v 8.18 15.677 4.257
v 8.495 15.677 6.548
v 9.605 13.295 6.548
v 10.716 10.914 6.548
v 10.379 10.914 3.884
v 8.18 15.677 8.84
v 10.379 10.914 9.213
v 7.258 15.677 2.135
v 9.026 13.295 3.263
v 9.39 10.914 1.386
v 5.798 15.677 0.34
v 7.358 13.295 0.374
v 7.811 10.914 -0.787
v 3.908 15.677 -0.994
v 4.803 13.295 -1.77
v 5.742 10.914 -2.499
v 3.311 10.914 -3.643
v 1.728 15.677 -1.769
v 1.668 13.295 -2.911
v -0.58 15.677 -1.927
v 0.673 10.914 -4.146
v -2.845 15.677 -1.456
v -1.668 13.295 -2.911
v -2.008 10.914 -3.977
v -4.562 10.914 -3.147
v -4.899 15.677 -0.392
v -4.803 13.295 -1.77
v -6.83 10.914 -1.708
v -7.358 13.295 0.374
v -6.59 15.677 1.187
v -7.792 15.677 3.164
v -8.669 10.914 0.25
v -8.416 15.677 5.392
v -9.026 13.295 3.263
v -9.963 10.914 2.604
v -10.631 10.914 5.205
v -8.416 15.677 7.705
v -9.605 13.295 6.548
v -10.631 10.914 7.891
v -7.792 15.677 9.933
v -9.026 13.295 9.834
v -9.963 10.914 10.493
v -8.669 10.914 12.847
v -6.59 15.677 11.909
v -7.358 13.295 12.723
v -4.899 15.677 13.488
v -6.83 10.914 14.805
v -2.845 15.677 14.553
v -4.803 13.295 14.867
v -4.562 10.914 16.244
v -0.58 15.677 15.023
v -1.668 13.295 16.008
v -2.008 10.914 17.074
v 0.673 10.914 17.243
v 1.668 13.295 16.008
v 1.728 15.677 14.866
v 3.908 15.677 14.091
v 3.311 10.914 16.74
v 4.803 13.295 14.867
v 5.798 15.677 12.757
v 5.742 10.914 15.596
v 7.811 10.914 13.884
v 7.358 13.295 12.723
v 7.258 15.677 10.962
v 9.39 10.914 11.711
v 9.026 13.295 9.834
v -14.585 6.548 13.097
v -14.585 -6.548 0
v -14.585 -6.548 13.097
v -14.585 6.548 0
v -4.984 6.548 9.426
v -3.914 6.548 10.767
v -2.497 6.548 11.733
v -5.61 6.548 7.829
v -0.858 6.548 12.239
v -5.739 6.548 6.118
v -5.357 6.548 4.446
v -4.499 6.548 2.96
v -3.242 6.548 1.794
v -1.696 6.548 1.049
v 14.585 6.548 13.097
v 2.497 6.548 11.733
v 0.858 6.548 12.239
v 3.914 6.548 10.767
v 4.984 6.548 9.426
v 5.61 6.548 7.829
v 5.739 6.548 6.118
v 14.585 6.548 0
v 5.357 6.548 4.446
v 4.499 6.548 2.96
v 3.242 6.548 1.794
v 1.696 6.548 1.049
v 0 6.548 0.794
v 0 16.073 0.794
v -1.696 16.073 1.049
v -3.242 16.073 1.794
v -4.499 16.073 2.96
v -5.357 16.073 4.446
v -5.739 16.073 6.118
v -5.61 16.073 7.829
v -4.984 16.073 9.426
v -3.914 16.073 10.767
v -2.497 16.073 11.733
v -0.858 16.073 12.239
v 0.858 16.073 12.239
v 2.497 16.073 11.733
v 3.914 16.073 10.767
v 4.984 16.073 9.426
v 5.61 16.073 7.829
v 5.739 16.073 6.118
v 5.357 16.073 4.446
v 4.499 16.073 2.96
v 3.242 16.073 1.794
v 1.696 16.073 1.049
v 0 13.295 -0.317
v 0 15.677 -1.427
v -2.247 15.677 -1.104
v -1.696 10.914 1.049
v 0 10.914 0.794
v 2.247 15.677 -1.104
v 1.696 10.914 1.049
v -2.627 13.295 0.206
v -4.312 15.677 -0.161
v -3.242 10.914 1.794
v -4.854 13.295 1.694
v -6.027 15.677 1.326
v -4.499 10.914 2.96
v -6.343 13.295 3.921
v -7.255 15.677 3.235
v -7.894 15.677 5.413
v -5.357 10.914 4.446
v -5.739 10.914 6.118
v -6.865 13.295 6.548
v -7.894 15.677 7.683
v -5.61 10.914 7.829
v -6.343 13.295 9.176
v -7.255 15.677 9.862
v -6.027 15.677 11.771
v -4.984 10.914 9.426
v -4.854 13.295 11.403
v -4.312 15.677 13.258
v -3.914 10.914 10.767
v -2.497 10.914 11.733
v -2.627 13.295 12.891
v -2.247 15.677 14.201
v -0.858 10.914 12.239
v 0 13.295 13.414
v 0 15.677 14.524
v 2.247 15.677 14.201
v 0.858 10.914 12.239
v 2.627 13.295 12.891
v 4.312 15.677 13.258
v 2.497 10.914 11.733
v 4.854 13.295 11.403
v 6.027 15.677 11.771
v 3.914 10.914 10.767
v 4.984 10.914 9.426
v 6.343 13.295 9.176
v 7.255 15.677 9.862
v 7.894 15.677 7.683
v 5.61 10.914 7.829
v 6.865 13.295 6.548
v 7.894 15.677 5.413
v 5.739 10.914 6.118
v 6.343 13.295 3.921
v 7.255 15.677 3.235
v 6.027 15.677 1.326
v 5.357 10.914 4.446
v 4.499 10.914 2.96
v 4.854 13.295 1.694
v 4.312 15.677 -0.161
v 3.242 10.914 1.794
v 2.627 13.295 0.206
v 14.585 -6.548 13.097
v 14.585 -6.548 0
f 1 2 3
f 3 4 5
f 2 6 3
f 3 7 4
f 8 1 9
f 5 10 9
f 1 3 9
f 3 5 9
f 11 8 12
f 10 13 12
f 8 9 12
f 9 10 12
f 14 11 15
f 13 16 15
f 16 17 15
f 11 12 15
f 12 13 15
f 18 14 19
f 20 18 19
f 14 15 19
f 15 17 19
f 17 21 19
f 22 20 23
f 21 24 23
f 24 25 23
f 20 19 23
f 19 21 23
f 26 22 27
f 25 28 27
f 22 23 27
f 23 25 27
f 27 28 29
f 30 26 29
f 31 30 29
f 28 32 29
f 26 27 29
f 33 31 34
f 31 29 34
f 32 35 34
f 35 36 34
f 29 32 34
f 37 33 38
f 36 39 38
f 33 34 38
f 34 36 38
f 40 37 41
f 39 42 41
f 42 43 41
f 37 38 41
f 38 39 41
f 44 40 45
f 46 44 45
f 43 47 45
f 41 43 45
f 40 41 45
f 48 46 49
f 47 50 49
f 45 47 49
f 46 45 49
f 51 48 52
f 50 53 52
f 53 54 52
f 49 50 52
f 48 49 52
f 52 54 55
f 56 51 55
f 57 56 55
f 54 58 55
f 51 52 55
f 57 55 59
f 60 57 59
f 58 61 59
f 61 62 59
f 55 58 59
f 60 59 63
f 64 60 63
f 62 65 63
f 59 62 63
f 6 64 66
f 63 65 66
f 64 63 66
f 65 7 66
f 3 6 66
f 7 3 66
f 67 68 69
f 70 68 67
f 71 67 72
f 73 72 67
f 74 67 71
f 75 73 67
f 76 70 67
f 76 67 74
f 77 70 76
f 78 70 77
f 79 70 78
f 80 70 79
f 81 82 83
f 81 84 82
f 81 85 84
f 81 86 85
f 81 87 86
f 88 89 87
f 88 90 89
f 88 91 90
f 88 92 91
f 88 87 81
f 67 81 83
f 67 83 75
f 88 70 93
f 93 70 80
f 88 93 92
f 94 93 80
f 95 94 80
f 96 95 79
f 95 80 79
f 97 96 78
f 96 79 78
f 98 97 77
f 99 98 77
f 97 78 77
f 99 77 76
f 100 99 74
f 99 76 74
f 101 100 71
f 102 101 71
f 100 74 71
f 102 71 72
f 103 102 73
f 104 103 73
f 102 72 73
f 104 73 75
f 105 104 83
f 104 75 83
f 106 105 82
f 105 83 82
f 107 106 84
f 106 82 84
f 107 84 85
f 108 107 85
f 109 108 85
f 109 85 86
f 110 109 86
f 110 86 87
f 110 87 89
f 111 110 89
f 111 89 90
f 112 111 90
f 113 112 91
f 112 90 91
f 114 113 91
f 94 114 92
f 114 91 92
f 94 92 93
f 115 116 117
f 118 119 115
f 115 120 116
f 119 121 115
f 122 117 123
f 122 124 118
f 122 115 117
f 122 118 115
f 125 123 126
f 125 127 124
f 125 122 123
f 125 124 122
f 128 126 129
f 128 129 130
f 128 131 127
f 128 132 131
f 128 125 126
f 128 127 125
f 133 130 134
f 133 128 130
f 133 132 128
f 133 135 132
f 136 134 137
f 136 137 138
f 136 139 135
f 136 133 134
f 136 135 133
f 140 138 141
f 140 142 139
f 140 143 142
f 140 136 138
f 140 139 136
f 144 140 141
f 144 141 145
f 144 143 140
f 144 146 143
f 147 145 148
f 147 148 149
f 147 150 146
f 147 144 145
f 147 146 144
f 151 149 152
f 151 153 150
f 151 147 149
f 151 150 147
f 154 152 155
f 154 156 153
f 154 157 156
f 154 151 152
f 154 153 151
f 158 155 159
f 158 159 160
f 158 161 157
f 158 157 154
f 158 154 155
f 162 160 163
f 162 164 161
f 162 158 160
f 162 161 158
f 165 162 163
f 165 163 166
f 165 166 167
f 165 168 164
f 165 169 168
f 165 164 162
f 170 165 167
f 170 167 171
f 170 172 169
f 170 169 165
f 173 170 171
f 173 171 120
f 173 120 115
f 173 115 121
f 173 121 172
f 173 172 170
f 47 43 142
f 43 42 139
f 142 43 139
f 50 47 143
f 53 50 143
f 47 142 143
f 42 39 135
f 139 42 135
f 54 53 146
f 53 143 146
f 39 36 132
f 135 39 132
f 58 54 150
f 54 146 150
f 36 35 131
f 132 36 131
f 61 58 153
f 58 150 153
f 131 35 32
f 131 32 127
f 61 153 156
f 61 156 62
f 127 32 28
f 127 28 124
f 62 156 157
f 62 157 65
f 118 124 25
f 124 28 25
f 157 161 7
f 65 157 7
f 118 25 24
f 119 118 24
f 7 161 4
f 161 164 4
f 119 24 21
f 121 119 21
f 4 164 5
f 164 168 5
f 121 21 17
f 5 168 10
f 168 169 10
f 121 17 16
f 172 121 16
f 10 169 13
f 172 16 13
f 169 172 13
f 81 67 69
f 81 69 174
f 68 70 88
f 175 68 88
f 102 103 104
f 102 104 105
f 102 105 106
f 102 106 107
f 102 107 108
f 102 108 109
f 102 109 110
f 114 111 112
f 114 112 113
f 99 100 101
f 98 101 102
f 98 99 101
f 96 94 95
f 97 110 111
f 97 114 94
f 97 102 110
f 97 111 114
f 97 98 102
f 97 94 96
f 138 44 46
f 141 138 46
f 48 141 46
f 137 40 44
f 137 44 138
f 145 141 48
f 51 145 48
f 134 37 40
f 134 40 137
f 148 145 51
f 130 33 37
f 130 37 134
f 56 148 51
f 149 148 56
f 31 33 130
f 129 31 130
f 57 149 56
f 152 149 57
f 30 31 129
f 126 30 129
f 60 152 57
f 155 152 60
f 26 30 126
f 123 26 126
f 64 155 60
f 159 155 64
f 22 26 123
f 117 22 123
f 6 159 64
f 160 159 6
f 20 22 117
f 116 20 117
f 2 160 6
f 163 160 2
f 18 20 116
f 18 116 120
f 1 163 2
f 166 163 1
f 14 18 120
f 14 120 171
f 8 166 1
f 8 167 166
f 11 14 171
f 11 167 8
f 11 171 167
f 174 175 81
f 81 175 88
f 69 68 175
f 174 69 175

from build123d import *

# Parameters (mm, degrees)
SKETCH1_W           = 29.1703125
SKETCH1_H           = 13.096875
BOSS_EXTRUDE1_DEPTH = 13.096875
SKETCH2_R           = 5.7546875
BOSS_EXTRUDE2_DEPTH = 9.525
BOSS_EXTRUDE3_START = -5.159375
SKETCH3_R           = 10.715625
SKETCH3_R_2         = 5.7546875
BOSS_EXTRUDE3_DEPTH = 4.7625
BOSS_EXTRUDE3_DRAFT = 25


with BuildPart() as part:
    # Sketch1 → Boss-Extrude1 (new body)
    with BuildSketch(Plane.XY):
        Rectangle(SKETCH1_W, SKETCH1_H)
    extrude(amount=BOSS_EXTRUDE1_DEPTH)

    # Sketch2 → Boss-Extrude2 (add)
    with BuildSketch(Plane(origin=(0, 6.5484375, 0), x_dir=(1, 0, 0), z_dir=(0, 1, 0))):
        with Locations(Location((0, -6.5484375, 0), (0, 0, 90))):
            Circle(SKETCH2_R)
    extrude(amount=BOSS_EXTRUDE2_DEPTH)


with BuildPart() as body_2:
    # Sketch3 → Boss-Extrude3 (with draft: the straight prism first)
    with BuildSketch(Plane(origin=(0, 16.0734375, 0), x_dir=(1, 0, 0), z_dir=(0, 1, 0)).offset(BOSS_EXTRUDE3_START)):
        with Locations((0, -6.5484375)):
            Circle(SKETCH3_R)
        with Locations(Location((0, -6.5484375, 0), (0, 0, 90))):
            Circle(SKETCH3_R_2, mode=Mode.SUBTRACT)
    extrude(amount=BOSS_EXTRUDE3_DEPTH)
    # Boss-Extrude3: the draft: its side faces are tilted about the plane it starts from
    boss_extrude3_sides = [body_2.faces().sort_by_distance(p)[0] for p in [
        (-10.715625, 13.2953125, 6.5484375),
        (0, 13.2953125, 12.303125),
    ]]
    draft(boss_extrude3_sides, Plane(origin=(0, 16.0734375, 0), x_dir=(1, 0, 0), z_dir=(0, 1, 0)).offset(BOSS_EXTRUDE3_START), BOSS_EXTRUDE3_DRAFT)


solid = Compound([part.part, body_2.part])
